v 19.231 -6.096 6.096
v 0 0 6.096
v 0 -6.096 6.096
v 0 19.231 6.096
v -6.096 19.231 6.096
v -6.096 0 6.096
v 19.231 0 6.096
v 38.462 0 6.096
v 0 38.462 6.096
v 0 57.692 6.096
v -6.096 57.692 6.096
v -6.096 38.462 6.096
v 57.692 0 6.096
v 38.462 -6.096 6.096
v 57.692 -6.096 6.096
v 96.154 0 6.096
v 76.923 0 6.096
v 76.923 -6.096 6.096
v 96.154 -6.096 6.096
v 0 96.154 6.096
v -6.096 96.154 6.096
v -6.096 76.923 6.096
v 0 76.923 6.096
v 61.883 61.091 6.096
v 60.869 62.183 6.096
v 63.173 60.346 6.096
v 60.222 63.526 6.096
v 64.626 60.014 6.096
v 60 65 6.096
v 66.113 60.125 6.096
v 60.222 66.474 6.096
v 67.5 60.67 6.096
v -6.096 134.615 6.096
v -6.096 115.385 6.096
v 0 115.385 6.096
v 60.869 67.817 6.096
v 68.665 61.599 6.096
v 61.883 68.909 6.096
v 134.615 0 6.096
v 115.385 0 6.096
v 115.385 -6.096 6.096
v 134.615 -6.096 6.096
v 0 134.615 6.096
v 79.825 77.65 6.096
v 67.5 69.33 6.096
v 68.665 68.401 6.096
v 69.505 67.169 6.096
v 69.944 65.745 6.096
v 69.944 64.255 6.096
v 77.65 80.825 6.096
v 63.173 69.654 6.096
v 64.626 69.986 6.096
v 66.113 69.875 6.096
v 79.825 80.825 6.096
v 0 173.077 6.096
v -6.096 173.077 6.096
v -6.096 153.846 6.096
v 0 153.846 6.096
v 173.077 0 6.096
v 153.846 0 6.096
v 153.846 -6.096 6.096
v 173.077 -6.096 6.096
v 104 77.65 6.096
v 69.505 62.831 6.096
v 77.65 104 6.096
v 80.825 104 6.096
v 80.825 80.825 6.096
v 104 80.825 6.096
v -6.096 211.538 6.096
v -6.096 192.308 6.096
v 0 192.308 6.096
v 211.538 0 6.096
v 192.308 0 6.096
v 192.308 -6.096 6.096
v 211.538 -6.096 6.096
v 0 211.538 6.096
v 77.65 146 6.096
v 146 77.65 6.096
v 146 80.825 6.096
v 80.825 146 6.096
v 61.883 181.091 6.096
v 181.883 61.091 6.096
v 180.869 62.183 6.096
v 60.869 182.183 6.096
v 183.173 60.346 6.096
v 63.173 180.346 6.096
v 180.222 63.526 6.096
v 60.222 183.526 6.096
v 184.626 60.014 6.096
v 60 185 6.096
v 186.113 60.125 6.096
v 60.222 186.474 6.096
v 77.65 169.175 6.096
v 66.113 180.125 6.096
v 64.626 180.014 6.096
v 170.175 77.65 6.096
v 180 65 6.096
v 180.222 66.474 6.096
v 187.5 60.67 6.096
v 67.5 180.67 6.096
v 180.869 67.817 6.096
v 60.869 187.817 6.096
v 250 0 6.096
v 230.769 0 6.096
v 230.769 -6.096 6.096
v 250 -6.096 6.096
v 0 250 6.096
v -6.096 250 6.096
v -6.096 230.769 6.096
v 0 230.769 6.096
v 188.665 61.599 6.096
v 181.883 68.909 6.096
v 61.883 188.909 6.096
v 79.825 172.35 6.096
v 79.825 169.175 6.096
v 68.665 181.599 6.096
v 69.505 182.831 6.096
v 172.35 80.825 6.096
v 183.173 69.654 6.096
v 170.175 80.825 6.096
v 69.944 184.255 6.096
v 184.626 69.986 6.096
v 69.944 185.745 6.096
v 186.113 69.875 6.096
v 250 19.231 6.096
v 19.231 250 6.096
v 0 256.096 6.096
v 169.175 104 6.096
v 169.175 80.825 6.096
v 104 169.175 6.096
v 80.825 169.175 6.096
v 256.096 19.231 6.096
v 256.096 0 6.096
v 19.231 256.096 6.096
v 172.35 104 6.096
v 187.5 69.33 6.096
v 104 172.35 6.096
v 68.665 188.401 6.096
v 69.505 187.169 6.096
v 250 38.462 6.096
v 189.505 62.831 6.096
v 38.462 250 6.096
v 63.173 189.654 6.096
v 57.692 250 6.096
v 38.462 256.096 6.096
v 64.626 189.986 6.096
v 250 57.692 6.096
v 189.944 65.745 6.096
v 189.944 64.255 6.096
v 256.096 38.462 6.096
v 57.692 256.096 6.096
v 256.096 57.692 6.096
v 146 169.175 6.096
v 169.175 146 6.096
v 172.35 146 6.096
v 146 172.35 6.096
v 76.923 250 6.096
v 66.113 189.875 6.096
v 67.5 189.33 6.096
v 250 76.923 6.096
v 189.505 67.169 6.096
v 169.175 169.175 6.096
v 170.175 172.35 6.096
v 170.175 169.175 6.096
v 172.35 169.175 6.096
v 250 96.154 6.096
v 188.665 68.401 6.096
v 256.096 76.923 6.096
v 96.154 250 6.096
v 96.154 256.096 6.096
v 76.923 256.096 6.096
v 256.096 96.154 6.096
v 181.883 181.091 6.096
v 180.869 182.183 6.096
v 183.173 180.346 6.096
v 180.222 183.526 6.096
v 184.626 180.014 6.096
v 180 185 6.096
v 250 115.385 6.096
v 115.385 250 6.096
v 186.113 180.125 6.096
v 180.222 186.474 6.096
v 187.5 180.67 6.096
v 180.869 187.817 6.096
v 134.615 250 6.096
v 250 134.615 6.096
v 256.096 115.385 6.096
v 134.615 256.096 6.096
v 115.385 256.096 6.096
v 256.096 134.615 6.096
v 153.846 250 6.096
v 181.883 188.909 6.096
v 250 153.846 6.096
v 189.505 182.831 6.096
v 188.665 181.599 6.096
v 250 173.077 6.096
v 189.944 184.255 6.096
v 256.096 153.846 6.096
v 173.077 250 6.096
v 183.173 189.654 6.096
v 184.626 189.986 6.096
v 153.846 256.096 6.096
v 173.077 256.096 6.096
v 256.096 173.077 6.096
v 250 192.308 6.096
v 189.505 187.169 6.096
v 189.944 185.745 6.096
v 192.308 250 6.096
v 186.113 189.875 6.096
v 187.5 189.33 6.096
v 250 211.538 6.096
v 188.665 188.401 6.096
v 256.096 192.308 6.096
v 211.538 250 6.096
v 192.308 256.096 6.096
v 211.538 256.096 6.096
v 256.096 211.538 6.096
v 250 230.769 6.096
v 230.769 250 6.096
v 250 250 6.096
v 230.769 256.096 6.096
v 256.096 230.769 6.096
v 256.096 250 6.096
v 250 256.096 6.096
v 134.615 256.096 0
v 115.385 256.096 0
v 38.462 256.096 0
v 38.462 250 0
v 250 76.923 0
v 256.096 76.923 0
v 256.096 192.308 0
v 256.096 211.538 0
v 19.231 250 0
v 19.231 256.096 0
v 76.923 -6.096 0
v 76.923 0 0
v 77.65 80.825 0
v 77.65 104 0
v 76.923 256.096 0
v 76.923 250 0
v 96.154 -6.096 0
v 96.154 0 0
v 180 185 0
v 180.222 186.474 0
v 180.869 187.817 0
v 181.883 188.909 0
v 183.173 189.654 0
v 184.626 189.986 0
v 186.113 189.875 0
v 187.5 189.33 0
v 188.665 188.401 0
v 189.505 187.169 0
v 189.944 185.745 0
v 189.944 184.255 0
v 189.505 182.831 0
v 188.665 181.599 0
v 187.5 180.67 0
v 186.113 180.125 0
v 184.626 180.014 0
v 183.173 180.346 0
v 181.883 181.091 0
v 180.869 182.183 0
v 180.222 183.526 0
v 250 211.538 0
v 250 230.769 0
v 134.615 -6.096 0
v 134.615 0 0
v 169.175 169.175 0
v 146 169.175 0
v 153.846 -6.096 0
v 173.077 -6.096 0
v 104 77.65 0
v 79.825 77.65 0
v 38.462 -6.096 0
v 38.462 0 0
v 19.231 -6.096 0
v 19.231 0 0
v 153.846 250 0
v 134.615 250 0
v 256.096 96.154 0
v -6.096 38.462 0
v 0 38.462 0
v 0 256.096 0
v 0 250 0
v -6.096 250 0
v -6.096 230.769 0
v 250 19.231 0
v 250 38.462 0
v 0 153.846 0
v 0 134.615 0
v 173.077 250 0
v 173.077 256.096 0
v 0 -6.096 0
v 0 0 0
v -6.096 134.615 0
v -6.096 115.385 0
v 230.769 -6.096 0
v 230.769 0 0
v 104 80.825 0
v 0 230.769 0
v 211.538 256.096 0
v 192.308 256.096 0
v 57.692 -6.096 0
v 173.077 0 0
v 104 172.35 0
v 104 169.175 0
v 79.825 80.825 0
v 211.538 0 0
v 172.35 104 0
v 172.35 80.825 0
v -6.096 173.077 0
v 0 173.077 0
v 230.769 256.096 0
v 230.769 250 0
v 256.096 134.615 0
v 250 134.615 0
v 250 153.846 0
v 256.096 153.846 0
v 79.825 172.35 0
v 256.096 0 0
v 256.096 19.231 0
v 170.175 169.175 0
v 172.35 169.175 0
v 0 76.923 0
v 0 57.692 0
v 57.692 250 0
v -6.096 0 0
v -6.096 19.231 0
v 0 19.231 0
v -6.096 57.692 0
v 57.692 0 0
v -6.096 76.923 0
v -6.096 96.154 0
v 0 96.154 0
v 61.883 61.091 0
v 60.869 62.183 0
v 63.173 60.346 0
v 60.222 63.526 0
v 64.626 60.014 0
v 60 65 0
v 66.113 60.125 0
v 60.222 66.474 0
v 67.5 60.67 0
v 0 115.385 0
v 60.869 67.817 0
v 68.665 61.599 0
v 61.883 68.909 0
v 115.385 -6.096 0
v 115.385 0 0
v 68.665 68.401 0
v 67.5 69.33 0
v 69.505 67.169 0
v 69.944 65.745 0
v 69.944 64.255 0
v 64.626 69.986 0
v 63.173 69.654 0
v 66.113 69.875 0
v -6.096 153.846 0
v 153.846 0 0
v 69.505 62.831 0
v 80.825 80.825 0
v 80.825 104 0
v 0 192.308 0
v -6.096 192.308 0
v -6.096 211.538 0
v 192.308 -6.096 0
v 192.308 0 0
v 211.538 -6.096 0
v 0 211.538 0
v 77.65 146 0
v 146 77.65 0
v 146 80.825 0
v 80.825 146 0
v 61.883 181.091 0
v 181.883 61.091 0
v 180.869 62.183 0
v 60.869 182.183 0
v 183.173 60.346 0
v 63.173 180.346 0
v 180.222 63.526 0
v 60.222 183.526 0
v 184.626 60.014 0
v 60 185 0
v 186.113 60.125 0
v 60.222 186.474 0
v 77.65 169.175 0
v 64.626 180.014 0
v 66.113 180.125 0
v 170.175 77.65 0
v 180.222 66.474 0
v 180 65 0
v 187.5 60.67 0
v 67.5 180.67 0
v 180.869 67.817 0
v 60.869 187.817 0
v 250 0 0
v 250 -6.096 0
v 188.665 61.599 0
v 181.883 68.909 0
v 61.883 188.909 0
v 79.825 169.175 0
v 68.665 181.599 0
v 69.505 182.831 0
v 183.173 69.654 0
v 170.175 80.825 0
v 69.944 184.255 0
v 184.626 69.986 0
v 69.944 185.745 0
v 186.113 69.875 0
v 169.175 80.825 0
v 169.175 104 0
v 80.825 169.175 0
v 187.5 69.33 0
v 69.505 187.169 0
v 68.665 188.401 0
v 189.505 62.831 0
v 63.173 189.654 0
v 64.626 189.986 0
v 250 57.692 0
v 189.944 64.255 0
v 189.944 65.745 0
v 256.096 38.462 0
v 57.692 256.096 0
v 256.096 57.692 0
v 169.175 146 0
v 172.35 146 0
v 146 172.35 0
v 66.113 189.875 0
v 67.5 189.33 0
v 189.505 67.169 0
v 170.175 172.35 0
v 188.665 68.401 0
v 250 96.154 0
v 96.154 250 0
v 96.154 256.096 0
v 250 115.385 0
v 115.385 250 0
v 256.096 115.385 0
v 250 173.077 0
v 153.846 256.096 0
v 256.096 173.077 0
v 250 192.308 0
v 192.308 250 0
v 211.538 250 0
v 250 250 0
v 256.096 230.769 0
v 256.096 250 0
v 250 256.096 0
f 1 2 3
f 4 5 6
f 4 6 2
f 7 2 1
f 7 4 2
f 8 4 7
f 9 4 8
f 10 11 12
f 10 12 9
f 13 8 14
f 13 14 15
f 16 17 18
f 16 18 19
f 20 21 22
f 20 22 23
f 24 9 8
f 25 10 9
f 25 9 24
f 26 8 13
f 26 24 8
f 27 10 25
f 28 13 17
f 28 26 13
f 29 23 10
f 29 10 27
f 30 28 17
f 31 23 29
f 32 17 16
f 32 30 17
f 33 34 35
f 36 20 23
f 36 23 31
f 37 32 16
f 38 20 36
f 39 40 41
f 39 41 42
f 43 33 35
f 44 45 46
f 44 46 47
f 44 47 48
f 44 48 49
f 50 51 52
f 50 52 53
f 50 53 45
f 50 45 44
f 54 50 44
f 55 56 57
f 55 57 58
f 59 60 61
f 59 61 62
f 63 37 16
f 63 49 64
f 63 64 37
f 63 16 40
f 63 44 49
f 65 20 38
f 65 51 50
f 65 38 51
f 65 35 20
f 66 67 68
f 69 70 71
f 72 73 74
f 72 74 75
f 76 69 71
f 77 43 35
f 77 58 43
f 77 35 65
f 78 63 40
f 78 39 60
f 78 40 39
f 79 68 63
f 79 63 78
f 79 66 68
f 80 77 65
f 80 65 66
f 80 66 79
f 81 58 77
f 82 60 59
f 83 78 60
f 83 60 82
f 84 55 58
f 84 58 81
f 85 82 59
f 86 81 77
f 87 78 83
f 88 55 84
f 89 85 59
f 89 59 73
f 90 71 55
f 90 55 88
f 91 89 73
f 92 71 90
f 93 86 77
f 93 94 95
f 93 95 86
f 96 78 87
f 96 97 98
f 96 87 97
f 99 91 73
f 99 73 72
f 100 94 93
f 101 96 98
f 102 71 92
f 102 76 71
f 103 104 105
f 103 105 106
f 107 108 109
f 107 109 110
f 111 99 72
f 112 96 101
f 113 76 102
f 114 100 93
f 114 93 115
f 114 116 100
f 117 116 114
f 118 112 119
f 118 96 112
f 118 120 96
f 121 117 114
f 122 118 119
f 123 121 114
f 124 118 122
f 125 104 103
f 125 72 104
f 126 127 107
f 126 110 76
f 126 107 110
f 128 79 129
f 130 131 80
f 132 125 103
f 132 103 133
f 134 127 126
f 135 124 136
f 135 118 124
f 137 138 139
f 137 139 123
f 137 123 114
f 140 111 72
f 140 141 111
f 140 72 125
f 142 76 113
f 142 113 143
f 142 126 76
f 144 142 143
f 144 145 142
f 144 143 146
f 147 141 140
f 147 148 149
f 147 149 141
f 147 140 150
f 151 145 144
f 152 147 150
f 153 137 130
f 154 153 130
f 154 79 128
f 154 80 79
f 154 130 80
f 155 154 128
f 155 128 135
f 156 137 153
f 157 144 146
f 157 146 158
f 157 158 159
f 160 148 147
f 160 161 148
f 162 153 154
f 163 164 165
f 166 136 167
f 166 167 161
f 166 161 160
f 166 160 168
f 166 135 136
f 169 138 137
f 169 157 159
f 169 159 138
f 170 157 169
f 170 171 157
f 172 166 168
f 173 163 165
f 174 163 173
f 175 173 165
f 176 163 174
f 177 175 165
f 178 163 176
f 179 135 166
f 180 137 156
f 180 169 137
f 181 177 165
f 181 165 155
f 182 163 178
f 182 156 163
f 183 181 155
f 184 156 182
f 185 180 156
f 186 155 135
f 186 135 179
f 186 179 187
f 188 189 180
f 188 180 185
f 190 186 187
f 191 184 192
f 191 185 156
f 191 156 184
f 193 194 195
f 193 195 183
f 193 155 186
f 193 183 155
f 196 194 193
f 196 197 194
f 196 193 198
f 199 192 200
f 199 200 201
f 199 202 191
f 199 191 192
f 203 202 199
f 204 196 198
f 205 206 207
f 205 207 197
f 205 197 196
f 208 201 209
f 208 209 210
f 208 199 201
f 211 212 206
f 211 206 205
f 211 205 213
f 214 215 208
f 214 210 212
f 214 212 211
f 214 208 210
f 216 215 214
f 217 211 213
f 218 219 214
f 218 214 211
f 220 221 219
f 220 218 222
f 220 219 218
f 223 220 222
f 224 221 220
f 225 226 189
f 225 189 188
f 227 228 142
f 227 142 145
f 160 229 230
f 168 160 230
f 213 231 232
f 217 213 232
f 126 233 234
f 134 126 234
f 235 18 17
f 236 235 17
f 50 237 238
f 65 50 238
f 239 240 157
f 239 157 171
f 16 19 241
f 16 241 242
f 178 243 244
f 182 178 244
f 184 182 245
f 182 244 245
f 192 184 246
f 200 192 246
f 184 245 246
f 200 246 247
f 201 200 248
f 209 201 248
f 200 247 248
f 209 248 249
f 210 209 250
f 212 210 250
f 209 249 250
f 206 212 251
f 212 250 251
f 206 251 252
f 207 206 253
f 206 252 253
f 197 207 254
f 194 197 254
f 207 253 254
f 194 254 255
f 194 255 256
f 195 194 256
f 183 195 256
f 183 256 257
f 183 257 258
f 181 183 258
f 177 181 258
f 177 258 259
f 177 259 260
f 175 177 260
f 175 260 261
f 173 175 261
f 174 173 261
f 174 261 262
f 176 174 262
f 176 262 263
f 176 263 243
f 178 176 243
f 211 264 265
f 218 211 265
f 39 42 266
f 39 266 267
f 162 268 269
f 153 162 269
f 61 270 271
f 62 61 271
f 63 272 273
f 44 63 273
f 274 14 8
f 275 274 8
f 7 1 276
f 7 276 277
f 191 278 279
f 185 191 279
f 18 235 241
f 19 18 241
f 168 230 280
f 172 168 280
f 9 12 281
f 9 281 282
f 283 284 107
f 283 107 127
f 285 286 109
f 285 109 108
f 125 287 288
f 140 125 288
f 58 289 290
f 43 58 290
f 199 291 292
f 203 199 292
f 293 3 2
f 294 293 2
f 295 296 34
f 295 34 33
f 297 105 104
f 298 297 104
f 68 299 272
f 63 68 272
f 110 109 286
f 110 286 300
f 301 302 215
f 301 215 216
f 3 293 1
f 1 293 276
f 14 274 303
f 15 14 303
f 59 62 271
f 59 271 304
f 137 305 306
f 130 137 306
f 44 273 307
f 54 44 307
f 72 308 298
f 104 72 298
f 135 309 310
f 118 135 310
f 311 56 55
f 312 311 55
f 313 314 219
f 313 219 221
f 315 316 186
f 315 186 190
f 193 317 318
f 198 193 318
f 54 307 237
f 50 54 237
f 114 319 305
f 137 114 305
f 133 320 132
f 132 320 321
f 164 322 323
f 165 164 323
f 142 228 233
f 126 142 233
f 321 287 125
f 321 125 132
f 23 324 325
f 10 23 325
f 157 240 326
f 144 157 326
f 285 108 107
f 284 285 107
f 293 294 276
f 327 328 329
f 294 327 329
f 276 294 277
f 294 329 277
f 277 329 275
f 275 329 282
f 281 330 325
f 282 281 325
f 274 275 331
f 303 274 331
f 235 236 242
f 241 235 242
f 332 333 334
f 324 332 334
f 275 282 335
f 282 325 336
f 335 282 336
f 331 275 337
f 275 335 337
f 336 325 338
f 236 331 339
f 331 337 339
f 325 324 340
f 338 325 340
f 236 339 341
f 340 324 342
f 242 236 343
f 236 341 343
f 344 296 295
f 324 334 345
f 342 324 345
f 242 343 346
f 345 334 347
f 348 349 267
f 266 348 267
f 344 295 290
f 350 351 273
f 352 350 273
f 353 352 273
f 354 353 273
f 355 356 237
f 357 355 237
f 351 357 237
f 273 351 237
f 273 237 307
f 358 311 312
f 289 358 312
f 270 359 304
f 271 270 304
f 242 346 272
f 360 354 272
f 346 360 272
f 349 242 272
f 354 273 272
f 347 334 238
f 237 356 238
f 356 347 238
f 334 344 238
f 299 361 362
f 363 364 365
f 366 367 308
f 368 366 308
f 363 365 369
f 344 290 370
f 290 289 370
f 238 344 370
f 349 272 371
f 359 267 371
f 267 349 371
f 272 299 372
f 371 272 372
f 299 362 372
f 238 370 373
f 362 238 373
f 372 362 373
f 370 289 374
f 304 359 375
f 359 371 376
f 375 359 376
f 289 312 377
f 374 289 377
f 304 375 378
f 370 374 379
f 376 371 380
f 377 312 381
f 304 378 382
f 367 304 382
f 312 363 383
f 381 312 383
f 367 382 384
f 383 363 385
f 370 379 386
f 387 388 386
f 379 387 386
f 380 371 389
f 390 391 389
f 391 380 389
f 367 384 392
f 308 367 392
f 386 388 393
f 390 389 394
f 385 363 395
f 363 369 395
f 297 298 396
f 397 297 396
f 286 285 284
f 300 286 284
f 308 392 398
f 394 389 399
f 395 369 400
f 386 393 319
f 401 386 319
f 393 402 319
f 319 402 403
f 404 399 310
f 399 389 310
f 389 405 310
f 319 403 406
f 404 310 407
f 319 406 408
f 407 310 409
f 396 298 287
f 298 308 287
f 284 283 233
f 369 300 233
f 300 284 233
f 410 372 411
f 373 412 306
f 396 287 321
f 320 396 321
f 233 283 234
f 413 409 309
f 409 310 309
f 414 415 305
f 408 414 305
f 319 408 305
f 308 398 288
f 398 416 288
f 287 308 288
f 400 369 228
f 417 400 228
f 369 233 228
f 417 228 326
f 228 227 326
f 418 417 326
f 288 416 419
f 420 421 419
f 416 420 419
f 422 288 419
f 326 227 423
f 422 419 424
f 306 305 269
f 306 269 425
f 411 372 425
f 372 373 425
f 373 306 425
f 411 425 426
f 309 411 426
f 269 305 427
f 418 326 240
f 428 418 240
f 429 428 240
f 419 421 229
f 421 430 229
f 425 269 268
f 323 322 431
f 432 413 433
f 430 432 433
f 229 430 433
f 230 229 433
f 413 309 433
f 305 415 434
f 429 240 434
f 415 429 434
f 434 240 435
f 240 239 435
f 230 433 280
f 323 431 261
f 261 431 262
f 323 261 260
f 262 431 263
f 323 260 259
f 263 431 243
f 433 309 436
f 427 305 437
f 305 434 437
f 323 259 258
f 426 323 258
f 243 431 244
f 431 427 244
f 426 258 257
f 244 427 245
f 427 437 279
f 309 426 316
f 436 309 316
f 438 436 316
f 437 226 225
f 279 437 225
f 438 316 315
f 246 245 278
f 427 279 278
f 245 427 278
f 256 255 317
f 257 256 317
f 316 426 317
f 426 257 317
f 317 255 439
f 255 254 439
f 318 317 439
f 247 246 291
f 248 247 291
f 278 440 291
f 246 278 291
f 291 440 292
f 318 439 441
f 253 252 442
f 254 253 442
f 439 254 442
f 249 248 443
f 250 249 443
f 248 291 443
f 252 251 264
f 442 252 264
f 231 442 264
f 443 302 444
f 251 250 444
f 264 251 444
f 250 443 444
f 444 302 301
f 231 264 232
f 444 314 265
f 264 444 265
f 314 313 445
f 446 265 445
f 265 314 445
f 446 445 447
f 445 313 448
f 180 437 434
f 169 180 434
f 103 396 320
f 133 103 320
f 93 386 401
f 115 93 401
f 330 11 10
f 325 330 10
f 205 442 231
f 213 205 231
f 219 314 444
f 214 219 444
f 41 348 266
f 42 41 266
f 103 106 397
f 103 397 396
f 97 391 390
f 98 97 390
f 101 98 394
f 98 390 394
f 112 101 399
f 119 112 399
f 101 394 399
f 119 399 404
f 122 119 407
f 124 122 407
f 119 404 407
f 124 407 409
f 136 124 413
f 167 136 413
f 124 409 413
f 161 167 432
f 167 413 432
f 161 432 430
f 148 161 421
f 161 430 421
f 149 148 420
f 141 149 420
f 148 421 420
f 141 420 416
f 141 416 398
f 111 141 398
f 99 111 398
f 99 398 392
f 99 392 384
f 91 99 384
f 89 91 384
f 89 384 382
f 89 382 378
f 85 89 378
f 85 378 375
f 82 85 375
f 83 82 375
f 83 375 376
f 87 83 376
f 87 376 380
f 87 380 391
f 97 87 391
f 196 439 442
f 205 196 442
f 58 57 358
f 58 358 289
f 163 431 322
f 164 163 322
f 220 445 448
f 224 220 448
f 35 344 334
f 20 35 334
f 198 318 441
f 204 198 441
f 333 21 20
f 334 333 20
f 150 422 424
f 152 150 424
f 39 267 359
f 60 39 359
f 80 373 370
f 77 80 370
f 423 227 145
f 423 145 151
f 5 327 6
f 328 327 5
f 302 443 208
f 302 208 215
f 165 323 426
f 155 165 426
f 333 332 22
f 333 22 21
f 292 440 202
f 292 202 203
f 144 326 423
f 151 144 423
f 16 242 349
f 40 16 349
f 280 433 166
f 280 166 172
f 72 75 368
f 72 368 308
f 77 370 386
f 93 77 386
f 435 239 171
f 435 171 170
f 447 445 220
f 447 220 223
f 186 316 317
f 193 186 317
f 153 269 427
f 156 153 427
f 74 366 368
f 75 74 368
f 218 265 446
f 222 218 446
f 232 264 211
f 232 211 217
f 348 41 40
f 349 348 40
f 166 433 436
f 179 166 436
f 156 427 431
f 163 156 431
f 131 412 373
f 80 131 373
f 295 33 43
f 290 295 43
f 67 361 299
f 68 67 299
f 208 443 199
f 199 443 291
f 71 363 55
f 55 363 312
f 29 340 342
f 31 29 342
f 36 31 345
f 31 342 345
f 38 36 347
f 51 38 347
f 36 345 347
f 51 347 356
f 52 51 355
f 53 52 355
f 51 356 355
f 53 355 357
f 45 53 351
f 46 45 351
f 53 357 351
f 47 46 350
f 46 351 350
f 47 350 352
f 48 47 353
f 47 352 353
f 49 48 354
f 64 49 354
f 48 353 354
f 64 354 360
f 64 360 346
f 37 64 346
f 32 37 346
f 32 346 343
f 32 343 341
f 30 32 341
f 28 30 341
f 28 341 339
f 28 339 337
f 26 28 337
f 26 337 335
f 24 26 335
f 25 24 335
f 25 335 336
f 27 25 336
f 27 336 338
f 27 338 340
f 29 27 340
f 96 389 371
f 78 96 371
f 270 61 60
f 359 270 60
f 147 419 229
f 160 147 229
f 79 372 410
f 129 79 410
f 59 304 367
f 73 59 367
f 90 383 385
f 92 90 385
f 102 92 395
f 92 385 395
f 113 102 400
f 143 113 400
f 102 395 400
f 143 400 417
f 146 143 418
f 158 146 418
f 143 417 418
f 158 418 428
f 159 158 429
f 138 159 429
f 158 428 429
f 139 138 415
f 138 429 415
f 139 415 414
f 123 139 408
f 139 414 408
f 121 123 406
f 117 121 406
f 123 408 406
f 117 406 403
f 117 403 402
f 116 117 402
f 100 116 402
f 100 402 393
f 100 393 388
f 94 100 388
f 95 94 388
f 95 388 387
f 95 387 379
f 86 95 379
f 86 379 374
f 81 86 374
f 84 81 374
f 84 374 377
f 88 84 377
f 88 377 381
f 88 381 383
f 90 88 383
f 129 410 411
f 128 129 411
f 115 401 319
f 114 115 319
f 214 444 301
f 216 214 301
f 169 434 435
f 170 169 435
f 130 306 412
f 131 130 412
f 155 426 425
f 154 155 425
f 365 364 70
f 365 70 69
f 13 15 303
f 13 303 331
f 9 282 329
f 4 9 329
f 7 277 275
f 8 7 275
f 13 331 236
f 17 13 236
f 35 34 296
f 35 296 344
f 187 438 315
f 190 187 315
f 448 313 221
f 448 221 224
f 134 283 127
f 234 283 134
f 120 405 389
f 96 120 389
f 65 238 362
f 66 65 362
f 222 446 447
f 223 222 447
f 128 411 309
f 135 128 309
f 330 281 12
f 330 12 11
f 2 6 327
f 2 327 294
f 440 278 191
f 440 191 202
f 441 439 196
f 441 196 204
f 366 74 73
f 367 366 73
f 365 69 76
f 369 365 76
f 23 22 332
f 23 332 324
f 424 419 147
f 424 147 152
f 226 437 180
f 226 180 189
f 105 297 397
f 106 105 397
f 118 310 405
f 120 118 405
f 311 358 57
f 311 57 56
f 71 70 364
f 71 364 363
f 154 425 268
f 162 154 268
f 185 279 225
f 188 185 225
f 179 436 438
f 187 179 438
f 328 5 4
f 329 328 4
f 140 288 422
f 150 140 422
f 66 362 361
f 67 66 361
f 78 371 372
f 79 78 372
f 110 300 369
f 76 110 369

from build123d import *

# Parameters (mm, degrees)
SKETCH2_W           = 6.096
SKETCH2_H           = 19.230769231
SKETCH2_W_2         = 19.230769231
SKETCH2_H_2         = 6.096
SKETCH2_W_3         = 19.23076923
SKETCH2_H_3         = 19.23076923
BOSS_EXTRUDE2_DEPTH = 6.096
SKETCH3_R           = 5
CUT_EXTRUDE1_DEPTH  = 363.225735762


with BuildPart() as part:
    # Sketch2 → Boss-Extrude2 (new body)
    # profile 1 of 29: a face of its own
    with BuildSketch(Plane.XY):
        Polygon((0, 19.230769231), (0, 0), (19.230769231, 0), (38.461538462, 0), (57.692307692, 0), (76.923076923, 0), (96.153846154, 0), (115.384615385, 0), (134.615384615, 0), (153.846153846, 0), (173.076923077, 0), (192.307692308, 0), (211.538461538, 0), (230.769230769, 0), (250, 0), (250, 19.230769231), (250, 38.461538462), (250, 57.692307692), (250, 76.923076923), (250, 96.153846154), (250, 115.384615385), (250, 134.615384615), (250, 153.846153846), (250, 173.076923077), (250, 192.307692308), (250, 211.538461538), (250, 230.769230769), (250, 250), (230.769230769, 250), (211.538461538, 250), (192.307692308, 250), (173.076923077, 250), (153.846153846, 250), (134.615384615, 250), (115.384615385, 250), (96.153846154, 250), (76.923076923, 250), (57.692307692, 250), (38.461538462, 250), (19.230769231, 250), (0, 250), (0, 230.769230769), (0, 211.538461538), (0, 192.307692308), (0, 173.076923077), (0, 153.846153846), (0, 134.615384615), (0, 115.384615385), (0, 96.153846154), (0, 76.923076923), (0, 57.692307692), (0, 38.461538462), align=None)
        Polygon((80.825, 104), (80.825, 80.825), (104, 80.825), (104, 77.65), (80.825, 77.65), (79.825, 77.65), (79.825, 80.825), (77.65, 80.825), (77.65, 104), align=None, mode=Mode.SUBTRACT)
        Polygon((146, 80.825), (169.175, 80.825), (169.175, 104), (172.35, 104), (172.35, 80.825), (170.175, 80.825), (170.175, 77.65), (169.175, 77.65), (146, 77.65), align=None, mode=Mode.SUBTRACT)
        Polygon((104, 169.175), (80.825, 169.175), (80.825, 146), (77.65, 146), (77.65, 169.175), (79.825, 169.175), (79.825, 172.35), (80.825, 172.35), (104, 172.35), align=None, mode=Mode.SUBTRACT)
        Polygon((169.175, 146), (169.175, 169.175), (146, 169.175), (146, 172.35), (169.175, 172.35), (170.175, 172.35), (170.175, 169.175), (172.35, 169.175), (172.35, 146), align=None, mode=Mode.SUBTRACT)
    # profile 2 of 29: a face of its own
    with BuildSketch(Plane.XY):
        with Locations((-3.048, 9.615384616)):
            Rectangle(SKETCH2_W, SKETCH2_H)
    # profile 3 of 29: a face of its own
    with BuildSketch(Plane.XY):
        with Locations((9.615384616, -3.048)):
            Rectangle(SKETCH2_W_2, SKETCH2_H_2)
    # profile 4 of 29: a face of its own
    with BuildSketch(Plane.XY):
        with Locations((48.076923077, -3.048)):
            Rectangle(SKETCH2_W_3, SKETCH2_H_2)
    # profile 5 of 29: a face of its own
    with BuildSketch(Plane.XY):
        with Locations((-3.048, 48.076923077)):
            Rectangle(SKETCH2_W, SKETCH2_H_3)
    # profile 6 of 29: a face of its own
    with BuildSketch(Plane.XY):
        with Locations((86.538461539, -3.048)):
            Rectangle(SKETCH2_W_2, SKETCH2_H_2)
    # profile 7 of 29: a face of its own
    with BuildSketch(Plane.XY):
        with Locations((-3.048, 86.538461539)):
            Rectangle(SKETCH2_W, SKETCH2_H)
    # profile 8 of 29: a face of its own
    with BuildSketch(Plane.XY):
        with Locations((125, -3.048)):
            Rectangle(SKETCH2_W_3, SKETCH2_H_2)
    # profile 9 of 29: a face of its own
    with BuildSketch(Plane.XY):
        with Locations((-3.048, 125)):
            Rectangle(SKETCH2_W, SKETCH2_H_3)
    # profile 10 of 29: a face of its own
    with BuildSketch(Plane.XY):
        with Locations((163.461538462, -3.048)):
            Rectangle(SKETCH2_W_2, SKETCH2_H_2)
    # profile 11 of 29: a face of its own
    with BuildSketch(Plane.XY):
        with Locations((-3.048, 163.461538462)):
            Rectangle(SKETCH2_W, SKETCH2_H)
    # profile 12 of 29: a face of its own
    with BuildSketch(Plane.XY):
        with Locations((201.923076923, -3.048)):
            Rectangle(SKETCH2_W_3, SKETCH2_H_2)
    # profile 13 of 29: a face of its own
    with BuildSketch(Plane.XY):
        with Locations((-3.048, 201.923076923)):
            Rectangle(SKETCH2_W, SKETCH2_H_3)
    # profile 14 of 29: a face of its own
    with BuildSketch(Plane.XY):
        with Locations((240.384615385, -3.048)):
            Rectangle(SKETCH2_W_2, SKETCH2_H_2)
    # profile 15 of 29: a face of its own
    with BuildSketch(Plane.XY):
        with Locations((-3.048, 240.384615385)):
            Rectangle(SKETCH2_W, SKETCH2_H)
    # profile 16 of 29: a face of its own
    with BuildSketch(Plane.XY):
        with Locations((253.048, 9.615384616)):
            Rectangle(SKETCH2_W, SKETCH2_H)
    # profile 17 of 29: a face of its own
    with BuildSketch(Plane.XY):
        with Locations((9.615384616, 253.048)):
            Rectangle(SKETCH2_W_2, SKETCH2_H_2)
    # profile 18 of 29: a face of its own
    with BuildSketch(Plane.XY):
        with Locations((253.048, 48.076923077)):
            Rectangle(SKETCH2_W, SKETCH2_H_3)
    # profile 19 of 29: a face of its own
    with BuildSketch(Plane.XY):
        with Locations((48.076923077, 253.048)):
            Rectangle(SKETCH2_W_3, SKETCH2_H_2)
    # profile 20 of 29: a face of its own
    with BuildSketch(Plane.XY):
        with Locations((253.048, 86.538461539)):
            Rectangle(SKETCH2_W, SKETCH2_H)
    # profile 21 of 29: a face of its own
    with BuildSketch(Plane.XY):
        with Locations((86.538461539, 253.048)):
            Rectangle(SKETCH2_W_2, SKETCH2_H_2)
    # profile 22 of 29: a face of its own
    with BuildSketch(Plane.XY):
        with Locations((253.048, 125)):
            Rectangle(SKETCH2_W, SKETCH2_H_3)
    # profile 23 of 29: a face of its own
    with BuildSketch(Plane.XY):
        with Locations((125, 253.048)):
            Rectangle(SKETCH2_W_3, SKETCH2_H_2)
    # profile 24 of 29: a face of its own
    with BuildSketch(Plane.XY):
        with Locations((253.048, 163.461538462)):
            Rectangle(SKETCH2_W, SKETCH2_H)
    # profile 25 of 29: a face of its own
    with BuildSketch(Plane.XY):
        with Locations((163.461538462, 253.048)):
            Rectangle(SKETCH2_W_2, SKETCH2_H_2)
    # profile 26 of 29: a face of its own
    with BuildSketch(Plane.XY):
        with Locations((253.048, 201.923076923)):
            Rectangle(SKETCH2_W, SKETCH2_H_3)
    # profile 27 of 29: a face of its own
    with BuildSketch(Plane.XY):
        with Locations((201.923076923, 253.048)):
            Rectangle(SKETCH2_W_3, SKETCH2_H_2)
    # profile 28 of 29: a face of its own
    with BuildSketch(Plane.XY):
        with Locations((253.048, 240.384615385)):
            Rectangle(SKETCH2_W, SKETCH2_H)
    # profile 29 of 29: a face of its own
    with BuildSketch(Plane.XY):
        with Locations((240.384615385, 253.048)):
            Rectangle(SKETCH2_W_2, SKETCH2_H_2)
    extrude(amount=BOSS_EXTRUDE2_DEPTH)

    # Sketch3 → Cut-Extrude1 (cut, through all)
    with BuildSketch(Plane(origin=(0, 0, 0), x_dir=(-1, 0, 0), z_dir=(0, 0, -1))):
        with Locations((-185, 185)):
            Circle(SKETCH3_R)
        with Locations((-65, 185)):
            Circle(SKETCH3_R)
        with Locations((-65, 65)):
            Circle(SKETCH3_R)
        with Locations((-185, 65)):
            Circle(SKETCH3_R)
    extrude(amount=-CUT_EXTRUDE1_DEPTH, mode=Mode.SUBTRACT)


solid = part.part
